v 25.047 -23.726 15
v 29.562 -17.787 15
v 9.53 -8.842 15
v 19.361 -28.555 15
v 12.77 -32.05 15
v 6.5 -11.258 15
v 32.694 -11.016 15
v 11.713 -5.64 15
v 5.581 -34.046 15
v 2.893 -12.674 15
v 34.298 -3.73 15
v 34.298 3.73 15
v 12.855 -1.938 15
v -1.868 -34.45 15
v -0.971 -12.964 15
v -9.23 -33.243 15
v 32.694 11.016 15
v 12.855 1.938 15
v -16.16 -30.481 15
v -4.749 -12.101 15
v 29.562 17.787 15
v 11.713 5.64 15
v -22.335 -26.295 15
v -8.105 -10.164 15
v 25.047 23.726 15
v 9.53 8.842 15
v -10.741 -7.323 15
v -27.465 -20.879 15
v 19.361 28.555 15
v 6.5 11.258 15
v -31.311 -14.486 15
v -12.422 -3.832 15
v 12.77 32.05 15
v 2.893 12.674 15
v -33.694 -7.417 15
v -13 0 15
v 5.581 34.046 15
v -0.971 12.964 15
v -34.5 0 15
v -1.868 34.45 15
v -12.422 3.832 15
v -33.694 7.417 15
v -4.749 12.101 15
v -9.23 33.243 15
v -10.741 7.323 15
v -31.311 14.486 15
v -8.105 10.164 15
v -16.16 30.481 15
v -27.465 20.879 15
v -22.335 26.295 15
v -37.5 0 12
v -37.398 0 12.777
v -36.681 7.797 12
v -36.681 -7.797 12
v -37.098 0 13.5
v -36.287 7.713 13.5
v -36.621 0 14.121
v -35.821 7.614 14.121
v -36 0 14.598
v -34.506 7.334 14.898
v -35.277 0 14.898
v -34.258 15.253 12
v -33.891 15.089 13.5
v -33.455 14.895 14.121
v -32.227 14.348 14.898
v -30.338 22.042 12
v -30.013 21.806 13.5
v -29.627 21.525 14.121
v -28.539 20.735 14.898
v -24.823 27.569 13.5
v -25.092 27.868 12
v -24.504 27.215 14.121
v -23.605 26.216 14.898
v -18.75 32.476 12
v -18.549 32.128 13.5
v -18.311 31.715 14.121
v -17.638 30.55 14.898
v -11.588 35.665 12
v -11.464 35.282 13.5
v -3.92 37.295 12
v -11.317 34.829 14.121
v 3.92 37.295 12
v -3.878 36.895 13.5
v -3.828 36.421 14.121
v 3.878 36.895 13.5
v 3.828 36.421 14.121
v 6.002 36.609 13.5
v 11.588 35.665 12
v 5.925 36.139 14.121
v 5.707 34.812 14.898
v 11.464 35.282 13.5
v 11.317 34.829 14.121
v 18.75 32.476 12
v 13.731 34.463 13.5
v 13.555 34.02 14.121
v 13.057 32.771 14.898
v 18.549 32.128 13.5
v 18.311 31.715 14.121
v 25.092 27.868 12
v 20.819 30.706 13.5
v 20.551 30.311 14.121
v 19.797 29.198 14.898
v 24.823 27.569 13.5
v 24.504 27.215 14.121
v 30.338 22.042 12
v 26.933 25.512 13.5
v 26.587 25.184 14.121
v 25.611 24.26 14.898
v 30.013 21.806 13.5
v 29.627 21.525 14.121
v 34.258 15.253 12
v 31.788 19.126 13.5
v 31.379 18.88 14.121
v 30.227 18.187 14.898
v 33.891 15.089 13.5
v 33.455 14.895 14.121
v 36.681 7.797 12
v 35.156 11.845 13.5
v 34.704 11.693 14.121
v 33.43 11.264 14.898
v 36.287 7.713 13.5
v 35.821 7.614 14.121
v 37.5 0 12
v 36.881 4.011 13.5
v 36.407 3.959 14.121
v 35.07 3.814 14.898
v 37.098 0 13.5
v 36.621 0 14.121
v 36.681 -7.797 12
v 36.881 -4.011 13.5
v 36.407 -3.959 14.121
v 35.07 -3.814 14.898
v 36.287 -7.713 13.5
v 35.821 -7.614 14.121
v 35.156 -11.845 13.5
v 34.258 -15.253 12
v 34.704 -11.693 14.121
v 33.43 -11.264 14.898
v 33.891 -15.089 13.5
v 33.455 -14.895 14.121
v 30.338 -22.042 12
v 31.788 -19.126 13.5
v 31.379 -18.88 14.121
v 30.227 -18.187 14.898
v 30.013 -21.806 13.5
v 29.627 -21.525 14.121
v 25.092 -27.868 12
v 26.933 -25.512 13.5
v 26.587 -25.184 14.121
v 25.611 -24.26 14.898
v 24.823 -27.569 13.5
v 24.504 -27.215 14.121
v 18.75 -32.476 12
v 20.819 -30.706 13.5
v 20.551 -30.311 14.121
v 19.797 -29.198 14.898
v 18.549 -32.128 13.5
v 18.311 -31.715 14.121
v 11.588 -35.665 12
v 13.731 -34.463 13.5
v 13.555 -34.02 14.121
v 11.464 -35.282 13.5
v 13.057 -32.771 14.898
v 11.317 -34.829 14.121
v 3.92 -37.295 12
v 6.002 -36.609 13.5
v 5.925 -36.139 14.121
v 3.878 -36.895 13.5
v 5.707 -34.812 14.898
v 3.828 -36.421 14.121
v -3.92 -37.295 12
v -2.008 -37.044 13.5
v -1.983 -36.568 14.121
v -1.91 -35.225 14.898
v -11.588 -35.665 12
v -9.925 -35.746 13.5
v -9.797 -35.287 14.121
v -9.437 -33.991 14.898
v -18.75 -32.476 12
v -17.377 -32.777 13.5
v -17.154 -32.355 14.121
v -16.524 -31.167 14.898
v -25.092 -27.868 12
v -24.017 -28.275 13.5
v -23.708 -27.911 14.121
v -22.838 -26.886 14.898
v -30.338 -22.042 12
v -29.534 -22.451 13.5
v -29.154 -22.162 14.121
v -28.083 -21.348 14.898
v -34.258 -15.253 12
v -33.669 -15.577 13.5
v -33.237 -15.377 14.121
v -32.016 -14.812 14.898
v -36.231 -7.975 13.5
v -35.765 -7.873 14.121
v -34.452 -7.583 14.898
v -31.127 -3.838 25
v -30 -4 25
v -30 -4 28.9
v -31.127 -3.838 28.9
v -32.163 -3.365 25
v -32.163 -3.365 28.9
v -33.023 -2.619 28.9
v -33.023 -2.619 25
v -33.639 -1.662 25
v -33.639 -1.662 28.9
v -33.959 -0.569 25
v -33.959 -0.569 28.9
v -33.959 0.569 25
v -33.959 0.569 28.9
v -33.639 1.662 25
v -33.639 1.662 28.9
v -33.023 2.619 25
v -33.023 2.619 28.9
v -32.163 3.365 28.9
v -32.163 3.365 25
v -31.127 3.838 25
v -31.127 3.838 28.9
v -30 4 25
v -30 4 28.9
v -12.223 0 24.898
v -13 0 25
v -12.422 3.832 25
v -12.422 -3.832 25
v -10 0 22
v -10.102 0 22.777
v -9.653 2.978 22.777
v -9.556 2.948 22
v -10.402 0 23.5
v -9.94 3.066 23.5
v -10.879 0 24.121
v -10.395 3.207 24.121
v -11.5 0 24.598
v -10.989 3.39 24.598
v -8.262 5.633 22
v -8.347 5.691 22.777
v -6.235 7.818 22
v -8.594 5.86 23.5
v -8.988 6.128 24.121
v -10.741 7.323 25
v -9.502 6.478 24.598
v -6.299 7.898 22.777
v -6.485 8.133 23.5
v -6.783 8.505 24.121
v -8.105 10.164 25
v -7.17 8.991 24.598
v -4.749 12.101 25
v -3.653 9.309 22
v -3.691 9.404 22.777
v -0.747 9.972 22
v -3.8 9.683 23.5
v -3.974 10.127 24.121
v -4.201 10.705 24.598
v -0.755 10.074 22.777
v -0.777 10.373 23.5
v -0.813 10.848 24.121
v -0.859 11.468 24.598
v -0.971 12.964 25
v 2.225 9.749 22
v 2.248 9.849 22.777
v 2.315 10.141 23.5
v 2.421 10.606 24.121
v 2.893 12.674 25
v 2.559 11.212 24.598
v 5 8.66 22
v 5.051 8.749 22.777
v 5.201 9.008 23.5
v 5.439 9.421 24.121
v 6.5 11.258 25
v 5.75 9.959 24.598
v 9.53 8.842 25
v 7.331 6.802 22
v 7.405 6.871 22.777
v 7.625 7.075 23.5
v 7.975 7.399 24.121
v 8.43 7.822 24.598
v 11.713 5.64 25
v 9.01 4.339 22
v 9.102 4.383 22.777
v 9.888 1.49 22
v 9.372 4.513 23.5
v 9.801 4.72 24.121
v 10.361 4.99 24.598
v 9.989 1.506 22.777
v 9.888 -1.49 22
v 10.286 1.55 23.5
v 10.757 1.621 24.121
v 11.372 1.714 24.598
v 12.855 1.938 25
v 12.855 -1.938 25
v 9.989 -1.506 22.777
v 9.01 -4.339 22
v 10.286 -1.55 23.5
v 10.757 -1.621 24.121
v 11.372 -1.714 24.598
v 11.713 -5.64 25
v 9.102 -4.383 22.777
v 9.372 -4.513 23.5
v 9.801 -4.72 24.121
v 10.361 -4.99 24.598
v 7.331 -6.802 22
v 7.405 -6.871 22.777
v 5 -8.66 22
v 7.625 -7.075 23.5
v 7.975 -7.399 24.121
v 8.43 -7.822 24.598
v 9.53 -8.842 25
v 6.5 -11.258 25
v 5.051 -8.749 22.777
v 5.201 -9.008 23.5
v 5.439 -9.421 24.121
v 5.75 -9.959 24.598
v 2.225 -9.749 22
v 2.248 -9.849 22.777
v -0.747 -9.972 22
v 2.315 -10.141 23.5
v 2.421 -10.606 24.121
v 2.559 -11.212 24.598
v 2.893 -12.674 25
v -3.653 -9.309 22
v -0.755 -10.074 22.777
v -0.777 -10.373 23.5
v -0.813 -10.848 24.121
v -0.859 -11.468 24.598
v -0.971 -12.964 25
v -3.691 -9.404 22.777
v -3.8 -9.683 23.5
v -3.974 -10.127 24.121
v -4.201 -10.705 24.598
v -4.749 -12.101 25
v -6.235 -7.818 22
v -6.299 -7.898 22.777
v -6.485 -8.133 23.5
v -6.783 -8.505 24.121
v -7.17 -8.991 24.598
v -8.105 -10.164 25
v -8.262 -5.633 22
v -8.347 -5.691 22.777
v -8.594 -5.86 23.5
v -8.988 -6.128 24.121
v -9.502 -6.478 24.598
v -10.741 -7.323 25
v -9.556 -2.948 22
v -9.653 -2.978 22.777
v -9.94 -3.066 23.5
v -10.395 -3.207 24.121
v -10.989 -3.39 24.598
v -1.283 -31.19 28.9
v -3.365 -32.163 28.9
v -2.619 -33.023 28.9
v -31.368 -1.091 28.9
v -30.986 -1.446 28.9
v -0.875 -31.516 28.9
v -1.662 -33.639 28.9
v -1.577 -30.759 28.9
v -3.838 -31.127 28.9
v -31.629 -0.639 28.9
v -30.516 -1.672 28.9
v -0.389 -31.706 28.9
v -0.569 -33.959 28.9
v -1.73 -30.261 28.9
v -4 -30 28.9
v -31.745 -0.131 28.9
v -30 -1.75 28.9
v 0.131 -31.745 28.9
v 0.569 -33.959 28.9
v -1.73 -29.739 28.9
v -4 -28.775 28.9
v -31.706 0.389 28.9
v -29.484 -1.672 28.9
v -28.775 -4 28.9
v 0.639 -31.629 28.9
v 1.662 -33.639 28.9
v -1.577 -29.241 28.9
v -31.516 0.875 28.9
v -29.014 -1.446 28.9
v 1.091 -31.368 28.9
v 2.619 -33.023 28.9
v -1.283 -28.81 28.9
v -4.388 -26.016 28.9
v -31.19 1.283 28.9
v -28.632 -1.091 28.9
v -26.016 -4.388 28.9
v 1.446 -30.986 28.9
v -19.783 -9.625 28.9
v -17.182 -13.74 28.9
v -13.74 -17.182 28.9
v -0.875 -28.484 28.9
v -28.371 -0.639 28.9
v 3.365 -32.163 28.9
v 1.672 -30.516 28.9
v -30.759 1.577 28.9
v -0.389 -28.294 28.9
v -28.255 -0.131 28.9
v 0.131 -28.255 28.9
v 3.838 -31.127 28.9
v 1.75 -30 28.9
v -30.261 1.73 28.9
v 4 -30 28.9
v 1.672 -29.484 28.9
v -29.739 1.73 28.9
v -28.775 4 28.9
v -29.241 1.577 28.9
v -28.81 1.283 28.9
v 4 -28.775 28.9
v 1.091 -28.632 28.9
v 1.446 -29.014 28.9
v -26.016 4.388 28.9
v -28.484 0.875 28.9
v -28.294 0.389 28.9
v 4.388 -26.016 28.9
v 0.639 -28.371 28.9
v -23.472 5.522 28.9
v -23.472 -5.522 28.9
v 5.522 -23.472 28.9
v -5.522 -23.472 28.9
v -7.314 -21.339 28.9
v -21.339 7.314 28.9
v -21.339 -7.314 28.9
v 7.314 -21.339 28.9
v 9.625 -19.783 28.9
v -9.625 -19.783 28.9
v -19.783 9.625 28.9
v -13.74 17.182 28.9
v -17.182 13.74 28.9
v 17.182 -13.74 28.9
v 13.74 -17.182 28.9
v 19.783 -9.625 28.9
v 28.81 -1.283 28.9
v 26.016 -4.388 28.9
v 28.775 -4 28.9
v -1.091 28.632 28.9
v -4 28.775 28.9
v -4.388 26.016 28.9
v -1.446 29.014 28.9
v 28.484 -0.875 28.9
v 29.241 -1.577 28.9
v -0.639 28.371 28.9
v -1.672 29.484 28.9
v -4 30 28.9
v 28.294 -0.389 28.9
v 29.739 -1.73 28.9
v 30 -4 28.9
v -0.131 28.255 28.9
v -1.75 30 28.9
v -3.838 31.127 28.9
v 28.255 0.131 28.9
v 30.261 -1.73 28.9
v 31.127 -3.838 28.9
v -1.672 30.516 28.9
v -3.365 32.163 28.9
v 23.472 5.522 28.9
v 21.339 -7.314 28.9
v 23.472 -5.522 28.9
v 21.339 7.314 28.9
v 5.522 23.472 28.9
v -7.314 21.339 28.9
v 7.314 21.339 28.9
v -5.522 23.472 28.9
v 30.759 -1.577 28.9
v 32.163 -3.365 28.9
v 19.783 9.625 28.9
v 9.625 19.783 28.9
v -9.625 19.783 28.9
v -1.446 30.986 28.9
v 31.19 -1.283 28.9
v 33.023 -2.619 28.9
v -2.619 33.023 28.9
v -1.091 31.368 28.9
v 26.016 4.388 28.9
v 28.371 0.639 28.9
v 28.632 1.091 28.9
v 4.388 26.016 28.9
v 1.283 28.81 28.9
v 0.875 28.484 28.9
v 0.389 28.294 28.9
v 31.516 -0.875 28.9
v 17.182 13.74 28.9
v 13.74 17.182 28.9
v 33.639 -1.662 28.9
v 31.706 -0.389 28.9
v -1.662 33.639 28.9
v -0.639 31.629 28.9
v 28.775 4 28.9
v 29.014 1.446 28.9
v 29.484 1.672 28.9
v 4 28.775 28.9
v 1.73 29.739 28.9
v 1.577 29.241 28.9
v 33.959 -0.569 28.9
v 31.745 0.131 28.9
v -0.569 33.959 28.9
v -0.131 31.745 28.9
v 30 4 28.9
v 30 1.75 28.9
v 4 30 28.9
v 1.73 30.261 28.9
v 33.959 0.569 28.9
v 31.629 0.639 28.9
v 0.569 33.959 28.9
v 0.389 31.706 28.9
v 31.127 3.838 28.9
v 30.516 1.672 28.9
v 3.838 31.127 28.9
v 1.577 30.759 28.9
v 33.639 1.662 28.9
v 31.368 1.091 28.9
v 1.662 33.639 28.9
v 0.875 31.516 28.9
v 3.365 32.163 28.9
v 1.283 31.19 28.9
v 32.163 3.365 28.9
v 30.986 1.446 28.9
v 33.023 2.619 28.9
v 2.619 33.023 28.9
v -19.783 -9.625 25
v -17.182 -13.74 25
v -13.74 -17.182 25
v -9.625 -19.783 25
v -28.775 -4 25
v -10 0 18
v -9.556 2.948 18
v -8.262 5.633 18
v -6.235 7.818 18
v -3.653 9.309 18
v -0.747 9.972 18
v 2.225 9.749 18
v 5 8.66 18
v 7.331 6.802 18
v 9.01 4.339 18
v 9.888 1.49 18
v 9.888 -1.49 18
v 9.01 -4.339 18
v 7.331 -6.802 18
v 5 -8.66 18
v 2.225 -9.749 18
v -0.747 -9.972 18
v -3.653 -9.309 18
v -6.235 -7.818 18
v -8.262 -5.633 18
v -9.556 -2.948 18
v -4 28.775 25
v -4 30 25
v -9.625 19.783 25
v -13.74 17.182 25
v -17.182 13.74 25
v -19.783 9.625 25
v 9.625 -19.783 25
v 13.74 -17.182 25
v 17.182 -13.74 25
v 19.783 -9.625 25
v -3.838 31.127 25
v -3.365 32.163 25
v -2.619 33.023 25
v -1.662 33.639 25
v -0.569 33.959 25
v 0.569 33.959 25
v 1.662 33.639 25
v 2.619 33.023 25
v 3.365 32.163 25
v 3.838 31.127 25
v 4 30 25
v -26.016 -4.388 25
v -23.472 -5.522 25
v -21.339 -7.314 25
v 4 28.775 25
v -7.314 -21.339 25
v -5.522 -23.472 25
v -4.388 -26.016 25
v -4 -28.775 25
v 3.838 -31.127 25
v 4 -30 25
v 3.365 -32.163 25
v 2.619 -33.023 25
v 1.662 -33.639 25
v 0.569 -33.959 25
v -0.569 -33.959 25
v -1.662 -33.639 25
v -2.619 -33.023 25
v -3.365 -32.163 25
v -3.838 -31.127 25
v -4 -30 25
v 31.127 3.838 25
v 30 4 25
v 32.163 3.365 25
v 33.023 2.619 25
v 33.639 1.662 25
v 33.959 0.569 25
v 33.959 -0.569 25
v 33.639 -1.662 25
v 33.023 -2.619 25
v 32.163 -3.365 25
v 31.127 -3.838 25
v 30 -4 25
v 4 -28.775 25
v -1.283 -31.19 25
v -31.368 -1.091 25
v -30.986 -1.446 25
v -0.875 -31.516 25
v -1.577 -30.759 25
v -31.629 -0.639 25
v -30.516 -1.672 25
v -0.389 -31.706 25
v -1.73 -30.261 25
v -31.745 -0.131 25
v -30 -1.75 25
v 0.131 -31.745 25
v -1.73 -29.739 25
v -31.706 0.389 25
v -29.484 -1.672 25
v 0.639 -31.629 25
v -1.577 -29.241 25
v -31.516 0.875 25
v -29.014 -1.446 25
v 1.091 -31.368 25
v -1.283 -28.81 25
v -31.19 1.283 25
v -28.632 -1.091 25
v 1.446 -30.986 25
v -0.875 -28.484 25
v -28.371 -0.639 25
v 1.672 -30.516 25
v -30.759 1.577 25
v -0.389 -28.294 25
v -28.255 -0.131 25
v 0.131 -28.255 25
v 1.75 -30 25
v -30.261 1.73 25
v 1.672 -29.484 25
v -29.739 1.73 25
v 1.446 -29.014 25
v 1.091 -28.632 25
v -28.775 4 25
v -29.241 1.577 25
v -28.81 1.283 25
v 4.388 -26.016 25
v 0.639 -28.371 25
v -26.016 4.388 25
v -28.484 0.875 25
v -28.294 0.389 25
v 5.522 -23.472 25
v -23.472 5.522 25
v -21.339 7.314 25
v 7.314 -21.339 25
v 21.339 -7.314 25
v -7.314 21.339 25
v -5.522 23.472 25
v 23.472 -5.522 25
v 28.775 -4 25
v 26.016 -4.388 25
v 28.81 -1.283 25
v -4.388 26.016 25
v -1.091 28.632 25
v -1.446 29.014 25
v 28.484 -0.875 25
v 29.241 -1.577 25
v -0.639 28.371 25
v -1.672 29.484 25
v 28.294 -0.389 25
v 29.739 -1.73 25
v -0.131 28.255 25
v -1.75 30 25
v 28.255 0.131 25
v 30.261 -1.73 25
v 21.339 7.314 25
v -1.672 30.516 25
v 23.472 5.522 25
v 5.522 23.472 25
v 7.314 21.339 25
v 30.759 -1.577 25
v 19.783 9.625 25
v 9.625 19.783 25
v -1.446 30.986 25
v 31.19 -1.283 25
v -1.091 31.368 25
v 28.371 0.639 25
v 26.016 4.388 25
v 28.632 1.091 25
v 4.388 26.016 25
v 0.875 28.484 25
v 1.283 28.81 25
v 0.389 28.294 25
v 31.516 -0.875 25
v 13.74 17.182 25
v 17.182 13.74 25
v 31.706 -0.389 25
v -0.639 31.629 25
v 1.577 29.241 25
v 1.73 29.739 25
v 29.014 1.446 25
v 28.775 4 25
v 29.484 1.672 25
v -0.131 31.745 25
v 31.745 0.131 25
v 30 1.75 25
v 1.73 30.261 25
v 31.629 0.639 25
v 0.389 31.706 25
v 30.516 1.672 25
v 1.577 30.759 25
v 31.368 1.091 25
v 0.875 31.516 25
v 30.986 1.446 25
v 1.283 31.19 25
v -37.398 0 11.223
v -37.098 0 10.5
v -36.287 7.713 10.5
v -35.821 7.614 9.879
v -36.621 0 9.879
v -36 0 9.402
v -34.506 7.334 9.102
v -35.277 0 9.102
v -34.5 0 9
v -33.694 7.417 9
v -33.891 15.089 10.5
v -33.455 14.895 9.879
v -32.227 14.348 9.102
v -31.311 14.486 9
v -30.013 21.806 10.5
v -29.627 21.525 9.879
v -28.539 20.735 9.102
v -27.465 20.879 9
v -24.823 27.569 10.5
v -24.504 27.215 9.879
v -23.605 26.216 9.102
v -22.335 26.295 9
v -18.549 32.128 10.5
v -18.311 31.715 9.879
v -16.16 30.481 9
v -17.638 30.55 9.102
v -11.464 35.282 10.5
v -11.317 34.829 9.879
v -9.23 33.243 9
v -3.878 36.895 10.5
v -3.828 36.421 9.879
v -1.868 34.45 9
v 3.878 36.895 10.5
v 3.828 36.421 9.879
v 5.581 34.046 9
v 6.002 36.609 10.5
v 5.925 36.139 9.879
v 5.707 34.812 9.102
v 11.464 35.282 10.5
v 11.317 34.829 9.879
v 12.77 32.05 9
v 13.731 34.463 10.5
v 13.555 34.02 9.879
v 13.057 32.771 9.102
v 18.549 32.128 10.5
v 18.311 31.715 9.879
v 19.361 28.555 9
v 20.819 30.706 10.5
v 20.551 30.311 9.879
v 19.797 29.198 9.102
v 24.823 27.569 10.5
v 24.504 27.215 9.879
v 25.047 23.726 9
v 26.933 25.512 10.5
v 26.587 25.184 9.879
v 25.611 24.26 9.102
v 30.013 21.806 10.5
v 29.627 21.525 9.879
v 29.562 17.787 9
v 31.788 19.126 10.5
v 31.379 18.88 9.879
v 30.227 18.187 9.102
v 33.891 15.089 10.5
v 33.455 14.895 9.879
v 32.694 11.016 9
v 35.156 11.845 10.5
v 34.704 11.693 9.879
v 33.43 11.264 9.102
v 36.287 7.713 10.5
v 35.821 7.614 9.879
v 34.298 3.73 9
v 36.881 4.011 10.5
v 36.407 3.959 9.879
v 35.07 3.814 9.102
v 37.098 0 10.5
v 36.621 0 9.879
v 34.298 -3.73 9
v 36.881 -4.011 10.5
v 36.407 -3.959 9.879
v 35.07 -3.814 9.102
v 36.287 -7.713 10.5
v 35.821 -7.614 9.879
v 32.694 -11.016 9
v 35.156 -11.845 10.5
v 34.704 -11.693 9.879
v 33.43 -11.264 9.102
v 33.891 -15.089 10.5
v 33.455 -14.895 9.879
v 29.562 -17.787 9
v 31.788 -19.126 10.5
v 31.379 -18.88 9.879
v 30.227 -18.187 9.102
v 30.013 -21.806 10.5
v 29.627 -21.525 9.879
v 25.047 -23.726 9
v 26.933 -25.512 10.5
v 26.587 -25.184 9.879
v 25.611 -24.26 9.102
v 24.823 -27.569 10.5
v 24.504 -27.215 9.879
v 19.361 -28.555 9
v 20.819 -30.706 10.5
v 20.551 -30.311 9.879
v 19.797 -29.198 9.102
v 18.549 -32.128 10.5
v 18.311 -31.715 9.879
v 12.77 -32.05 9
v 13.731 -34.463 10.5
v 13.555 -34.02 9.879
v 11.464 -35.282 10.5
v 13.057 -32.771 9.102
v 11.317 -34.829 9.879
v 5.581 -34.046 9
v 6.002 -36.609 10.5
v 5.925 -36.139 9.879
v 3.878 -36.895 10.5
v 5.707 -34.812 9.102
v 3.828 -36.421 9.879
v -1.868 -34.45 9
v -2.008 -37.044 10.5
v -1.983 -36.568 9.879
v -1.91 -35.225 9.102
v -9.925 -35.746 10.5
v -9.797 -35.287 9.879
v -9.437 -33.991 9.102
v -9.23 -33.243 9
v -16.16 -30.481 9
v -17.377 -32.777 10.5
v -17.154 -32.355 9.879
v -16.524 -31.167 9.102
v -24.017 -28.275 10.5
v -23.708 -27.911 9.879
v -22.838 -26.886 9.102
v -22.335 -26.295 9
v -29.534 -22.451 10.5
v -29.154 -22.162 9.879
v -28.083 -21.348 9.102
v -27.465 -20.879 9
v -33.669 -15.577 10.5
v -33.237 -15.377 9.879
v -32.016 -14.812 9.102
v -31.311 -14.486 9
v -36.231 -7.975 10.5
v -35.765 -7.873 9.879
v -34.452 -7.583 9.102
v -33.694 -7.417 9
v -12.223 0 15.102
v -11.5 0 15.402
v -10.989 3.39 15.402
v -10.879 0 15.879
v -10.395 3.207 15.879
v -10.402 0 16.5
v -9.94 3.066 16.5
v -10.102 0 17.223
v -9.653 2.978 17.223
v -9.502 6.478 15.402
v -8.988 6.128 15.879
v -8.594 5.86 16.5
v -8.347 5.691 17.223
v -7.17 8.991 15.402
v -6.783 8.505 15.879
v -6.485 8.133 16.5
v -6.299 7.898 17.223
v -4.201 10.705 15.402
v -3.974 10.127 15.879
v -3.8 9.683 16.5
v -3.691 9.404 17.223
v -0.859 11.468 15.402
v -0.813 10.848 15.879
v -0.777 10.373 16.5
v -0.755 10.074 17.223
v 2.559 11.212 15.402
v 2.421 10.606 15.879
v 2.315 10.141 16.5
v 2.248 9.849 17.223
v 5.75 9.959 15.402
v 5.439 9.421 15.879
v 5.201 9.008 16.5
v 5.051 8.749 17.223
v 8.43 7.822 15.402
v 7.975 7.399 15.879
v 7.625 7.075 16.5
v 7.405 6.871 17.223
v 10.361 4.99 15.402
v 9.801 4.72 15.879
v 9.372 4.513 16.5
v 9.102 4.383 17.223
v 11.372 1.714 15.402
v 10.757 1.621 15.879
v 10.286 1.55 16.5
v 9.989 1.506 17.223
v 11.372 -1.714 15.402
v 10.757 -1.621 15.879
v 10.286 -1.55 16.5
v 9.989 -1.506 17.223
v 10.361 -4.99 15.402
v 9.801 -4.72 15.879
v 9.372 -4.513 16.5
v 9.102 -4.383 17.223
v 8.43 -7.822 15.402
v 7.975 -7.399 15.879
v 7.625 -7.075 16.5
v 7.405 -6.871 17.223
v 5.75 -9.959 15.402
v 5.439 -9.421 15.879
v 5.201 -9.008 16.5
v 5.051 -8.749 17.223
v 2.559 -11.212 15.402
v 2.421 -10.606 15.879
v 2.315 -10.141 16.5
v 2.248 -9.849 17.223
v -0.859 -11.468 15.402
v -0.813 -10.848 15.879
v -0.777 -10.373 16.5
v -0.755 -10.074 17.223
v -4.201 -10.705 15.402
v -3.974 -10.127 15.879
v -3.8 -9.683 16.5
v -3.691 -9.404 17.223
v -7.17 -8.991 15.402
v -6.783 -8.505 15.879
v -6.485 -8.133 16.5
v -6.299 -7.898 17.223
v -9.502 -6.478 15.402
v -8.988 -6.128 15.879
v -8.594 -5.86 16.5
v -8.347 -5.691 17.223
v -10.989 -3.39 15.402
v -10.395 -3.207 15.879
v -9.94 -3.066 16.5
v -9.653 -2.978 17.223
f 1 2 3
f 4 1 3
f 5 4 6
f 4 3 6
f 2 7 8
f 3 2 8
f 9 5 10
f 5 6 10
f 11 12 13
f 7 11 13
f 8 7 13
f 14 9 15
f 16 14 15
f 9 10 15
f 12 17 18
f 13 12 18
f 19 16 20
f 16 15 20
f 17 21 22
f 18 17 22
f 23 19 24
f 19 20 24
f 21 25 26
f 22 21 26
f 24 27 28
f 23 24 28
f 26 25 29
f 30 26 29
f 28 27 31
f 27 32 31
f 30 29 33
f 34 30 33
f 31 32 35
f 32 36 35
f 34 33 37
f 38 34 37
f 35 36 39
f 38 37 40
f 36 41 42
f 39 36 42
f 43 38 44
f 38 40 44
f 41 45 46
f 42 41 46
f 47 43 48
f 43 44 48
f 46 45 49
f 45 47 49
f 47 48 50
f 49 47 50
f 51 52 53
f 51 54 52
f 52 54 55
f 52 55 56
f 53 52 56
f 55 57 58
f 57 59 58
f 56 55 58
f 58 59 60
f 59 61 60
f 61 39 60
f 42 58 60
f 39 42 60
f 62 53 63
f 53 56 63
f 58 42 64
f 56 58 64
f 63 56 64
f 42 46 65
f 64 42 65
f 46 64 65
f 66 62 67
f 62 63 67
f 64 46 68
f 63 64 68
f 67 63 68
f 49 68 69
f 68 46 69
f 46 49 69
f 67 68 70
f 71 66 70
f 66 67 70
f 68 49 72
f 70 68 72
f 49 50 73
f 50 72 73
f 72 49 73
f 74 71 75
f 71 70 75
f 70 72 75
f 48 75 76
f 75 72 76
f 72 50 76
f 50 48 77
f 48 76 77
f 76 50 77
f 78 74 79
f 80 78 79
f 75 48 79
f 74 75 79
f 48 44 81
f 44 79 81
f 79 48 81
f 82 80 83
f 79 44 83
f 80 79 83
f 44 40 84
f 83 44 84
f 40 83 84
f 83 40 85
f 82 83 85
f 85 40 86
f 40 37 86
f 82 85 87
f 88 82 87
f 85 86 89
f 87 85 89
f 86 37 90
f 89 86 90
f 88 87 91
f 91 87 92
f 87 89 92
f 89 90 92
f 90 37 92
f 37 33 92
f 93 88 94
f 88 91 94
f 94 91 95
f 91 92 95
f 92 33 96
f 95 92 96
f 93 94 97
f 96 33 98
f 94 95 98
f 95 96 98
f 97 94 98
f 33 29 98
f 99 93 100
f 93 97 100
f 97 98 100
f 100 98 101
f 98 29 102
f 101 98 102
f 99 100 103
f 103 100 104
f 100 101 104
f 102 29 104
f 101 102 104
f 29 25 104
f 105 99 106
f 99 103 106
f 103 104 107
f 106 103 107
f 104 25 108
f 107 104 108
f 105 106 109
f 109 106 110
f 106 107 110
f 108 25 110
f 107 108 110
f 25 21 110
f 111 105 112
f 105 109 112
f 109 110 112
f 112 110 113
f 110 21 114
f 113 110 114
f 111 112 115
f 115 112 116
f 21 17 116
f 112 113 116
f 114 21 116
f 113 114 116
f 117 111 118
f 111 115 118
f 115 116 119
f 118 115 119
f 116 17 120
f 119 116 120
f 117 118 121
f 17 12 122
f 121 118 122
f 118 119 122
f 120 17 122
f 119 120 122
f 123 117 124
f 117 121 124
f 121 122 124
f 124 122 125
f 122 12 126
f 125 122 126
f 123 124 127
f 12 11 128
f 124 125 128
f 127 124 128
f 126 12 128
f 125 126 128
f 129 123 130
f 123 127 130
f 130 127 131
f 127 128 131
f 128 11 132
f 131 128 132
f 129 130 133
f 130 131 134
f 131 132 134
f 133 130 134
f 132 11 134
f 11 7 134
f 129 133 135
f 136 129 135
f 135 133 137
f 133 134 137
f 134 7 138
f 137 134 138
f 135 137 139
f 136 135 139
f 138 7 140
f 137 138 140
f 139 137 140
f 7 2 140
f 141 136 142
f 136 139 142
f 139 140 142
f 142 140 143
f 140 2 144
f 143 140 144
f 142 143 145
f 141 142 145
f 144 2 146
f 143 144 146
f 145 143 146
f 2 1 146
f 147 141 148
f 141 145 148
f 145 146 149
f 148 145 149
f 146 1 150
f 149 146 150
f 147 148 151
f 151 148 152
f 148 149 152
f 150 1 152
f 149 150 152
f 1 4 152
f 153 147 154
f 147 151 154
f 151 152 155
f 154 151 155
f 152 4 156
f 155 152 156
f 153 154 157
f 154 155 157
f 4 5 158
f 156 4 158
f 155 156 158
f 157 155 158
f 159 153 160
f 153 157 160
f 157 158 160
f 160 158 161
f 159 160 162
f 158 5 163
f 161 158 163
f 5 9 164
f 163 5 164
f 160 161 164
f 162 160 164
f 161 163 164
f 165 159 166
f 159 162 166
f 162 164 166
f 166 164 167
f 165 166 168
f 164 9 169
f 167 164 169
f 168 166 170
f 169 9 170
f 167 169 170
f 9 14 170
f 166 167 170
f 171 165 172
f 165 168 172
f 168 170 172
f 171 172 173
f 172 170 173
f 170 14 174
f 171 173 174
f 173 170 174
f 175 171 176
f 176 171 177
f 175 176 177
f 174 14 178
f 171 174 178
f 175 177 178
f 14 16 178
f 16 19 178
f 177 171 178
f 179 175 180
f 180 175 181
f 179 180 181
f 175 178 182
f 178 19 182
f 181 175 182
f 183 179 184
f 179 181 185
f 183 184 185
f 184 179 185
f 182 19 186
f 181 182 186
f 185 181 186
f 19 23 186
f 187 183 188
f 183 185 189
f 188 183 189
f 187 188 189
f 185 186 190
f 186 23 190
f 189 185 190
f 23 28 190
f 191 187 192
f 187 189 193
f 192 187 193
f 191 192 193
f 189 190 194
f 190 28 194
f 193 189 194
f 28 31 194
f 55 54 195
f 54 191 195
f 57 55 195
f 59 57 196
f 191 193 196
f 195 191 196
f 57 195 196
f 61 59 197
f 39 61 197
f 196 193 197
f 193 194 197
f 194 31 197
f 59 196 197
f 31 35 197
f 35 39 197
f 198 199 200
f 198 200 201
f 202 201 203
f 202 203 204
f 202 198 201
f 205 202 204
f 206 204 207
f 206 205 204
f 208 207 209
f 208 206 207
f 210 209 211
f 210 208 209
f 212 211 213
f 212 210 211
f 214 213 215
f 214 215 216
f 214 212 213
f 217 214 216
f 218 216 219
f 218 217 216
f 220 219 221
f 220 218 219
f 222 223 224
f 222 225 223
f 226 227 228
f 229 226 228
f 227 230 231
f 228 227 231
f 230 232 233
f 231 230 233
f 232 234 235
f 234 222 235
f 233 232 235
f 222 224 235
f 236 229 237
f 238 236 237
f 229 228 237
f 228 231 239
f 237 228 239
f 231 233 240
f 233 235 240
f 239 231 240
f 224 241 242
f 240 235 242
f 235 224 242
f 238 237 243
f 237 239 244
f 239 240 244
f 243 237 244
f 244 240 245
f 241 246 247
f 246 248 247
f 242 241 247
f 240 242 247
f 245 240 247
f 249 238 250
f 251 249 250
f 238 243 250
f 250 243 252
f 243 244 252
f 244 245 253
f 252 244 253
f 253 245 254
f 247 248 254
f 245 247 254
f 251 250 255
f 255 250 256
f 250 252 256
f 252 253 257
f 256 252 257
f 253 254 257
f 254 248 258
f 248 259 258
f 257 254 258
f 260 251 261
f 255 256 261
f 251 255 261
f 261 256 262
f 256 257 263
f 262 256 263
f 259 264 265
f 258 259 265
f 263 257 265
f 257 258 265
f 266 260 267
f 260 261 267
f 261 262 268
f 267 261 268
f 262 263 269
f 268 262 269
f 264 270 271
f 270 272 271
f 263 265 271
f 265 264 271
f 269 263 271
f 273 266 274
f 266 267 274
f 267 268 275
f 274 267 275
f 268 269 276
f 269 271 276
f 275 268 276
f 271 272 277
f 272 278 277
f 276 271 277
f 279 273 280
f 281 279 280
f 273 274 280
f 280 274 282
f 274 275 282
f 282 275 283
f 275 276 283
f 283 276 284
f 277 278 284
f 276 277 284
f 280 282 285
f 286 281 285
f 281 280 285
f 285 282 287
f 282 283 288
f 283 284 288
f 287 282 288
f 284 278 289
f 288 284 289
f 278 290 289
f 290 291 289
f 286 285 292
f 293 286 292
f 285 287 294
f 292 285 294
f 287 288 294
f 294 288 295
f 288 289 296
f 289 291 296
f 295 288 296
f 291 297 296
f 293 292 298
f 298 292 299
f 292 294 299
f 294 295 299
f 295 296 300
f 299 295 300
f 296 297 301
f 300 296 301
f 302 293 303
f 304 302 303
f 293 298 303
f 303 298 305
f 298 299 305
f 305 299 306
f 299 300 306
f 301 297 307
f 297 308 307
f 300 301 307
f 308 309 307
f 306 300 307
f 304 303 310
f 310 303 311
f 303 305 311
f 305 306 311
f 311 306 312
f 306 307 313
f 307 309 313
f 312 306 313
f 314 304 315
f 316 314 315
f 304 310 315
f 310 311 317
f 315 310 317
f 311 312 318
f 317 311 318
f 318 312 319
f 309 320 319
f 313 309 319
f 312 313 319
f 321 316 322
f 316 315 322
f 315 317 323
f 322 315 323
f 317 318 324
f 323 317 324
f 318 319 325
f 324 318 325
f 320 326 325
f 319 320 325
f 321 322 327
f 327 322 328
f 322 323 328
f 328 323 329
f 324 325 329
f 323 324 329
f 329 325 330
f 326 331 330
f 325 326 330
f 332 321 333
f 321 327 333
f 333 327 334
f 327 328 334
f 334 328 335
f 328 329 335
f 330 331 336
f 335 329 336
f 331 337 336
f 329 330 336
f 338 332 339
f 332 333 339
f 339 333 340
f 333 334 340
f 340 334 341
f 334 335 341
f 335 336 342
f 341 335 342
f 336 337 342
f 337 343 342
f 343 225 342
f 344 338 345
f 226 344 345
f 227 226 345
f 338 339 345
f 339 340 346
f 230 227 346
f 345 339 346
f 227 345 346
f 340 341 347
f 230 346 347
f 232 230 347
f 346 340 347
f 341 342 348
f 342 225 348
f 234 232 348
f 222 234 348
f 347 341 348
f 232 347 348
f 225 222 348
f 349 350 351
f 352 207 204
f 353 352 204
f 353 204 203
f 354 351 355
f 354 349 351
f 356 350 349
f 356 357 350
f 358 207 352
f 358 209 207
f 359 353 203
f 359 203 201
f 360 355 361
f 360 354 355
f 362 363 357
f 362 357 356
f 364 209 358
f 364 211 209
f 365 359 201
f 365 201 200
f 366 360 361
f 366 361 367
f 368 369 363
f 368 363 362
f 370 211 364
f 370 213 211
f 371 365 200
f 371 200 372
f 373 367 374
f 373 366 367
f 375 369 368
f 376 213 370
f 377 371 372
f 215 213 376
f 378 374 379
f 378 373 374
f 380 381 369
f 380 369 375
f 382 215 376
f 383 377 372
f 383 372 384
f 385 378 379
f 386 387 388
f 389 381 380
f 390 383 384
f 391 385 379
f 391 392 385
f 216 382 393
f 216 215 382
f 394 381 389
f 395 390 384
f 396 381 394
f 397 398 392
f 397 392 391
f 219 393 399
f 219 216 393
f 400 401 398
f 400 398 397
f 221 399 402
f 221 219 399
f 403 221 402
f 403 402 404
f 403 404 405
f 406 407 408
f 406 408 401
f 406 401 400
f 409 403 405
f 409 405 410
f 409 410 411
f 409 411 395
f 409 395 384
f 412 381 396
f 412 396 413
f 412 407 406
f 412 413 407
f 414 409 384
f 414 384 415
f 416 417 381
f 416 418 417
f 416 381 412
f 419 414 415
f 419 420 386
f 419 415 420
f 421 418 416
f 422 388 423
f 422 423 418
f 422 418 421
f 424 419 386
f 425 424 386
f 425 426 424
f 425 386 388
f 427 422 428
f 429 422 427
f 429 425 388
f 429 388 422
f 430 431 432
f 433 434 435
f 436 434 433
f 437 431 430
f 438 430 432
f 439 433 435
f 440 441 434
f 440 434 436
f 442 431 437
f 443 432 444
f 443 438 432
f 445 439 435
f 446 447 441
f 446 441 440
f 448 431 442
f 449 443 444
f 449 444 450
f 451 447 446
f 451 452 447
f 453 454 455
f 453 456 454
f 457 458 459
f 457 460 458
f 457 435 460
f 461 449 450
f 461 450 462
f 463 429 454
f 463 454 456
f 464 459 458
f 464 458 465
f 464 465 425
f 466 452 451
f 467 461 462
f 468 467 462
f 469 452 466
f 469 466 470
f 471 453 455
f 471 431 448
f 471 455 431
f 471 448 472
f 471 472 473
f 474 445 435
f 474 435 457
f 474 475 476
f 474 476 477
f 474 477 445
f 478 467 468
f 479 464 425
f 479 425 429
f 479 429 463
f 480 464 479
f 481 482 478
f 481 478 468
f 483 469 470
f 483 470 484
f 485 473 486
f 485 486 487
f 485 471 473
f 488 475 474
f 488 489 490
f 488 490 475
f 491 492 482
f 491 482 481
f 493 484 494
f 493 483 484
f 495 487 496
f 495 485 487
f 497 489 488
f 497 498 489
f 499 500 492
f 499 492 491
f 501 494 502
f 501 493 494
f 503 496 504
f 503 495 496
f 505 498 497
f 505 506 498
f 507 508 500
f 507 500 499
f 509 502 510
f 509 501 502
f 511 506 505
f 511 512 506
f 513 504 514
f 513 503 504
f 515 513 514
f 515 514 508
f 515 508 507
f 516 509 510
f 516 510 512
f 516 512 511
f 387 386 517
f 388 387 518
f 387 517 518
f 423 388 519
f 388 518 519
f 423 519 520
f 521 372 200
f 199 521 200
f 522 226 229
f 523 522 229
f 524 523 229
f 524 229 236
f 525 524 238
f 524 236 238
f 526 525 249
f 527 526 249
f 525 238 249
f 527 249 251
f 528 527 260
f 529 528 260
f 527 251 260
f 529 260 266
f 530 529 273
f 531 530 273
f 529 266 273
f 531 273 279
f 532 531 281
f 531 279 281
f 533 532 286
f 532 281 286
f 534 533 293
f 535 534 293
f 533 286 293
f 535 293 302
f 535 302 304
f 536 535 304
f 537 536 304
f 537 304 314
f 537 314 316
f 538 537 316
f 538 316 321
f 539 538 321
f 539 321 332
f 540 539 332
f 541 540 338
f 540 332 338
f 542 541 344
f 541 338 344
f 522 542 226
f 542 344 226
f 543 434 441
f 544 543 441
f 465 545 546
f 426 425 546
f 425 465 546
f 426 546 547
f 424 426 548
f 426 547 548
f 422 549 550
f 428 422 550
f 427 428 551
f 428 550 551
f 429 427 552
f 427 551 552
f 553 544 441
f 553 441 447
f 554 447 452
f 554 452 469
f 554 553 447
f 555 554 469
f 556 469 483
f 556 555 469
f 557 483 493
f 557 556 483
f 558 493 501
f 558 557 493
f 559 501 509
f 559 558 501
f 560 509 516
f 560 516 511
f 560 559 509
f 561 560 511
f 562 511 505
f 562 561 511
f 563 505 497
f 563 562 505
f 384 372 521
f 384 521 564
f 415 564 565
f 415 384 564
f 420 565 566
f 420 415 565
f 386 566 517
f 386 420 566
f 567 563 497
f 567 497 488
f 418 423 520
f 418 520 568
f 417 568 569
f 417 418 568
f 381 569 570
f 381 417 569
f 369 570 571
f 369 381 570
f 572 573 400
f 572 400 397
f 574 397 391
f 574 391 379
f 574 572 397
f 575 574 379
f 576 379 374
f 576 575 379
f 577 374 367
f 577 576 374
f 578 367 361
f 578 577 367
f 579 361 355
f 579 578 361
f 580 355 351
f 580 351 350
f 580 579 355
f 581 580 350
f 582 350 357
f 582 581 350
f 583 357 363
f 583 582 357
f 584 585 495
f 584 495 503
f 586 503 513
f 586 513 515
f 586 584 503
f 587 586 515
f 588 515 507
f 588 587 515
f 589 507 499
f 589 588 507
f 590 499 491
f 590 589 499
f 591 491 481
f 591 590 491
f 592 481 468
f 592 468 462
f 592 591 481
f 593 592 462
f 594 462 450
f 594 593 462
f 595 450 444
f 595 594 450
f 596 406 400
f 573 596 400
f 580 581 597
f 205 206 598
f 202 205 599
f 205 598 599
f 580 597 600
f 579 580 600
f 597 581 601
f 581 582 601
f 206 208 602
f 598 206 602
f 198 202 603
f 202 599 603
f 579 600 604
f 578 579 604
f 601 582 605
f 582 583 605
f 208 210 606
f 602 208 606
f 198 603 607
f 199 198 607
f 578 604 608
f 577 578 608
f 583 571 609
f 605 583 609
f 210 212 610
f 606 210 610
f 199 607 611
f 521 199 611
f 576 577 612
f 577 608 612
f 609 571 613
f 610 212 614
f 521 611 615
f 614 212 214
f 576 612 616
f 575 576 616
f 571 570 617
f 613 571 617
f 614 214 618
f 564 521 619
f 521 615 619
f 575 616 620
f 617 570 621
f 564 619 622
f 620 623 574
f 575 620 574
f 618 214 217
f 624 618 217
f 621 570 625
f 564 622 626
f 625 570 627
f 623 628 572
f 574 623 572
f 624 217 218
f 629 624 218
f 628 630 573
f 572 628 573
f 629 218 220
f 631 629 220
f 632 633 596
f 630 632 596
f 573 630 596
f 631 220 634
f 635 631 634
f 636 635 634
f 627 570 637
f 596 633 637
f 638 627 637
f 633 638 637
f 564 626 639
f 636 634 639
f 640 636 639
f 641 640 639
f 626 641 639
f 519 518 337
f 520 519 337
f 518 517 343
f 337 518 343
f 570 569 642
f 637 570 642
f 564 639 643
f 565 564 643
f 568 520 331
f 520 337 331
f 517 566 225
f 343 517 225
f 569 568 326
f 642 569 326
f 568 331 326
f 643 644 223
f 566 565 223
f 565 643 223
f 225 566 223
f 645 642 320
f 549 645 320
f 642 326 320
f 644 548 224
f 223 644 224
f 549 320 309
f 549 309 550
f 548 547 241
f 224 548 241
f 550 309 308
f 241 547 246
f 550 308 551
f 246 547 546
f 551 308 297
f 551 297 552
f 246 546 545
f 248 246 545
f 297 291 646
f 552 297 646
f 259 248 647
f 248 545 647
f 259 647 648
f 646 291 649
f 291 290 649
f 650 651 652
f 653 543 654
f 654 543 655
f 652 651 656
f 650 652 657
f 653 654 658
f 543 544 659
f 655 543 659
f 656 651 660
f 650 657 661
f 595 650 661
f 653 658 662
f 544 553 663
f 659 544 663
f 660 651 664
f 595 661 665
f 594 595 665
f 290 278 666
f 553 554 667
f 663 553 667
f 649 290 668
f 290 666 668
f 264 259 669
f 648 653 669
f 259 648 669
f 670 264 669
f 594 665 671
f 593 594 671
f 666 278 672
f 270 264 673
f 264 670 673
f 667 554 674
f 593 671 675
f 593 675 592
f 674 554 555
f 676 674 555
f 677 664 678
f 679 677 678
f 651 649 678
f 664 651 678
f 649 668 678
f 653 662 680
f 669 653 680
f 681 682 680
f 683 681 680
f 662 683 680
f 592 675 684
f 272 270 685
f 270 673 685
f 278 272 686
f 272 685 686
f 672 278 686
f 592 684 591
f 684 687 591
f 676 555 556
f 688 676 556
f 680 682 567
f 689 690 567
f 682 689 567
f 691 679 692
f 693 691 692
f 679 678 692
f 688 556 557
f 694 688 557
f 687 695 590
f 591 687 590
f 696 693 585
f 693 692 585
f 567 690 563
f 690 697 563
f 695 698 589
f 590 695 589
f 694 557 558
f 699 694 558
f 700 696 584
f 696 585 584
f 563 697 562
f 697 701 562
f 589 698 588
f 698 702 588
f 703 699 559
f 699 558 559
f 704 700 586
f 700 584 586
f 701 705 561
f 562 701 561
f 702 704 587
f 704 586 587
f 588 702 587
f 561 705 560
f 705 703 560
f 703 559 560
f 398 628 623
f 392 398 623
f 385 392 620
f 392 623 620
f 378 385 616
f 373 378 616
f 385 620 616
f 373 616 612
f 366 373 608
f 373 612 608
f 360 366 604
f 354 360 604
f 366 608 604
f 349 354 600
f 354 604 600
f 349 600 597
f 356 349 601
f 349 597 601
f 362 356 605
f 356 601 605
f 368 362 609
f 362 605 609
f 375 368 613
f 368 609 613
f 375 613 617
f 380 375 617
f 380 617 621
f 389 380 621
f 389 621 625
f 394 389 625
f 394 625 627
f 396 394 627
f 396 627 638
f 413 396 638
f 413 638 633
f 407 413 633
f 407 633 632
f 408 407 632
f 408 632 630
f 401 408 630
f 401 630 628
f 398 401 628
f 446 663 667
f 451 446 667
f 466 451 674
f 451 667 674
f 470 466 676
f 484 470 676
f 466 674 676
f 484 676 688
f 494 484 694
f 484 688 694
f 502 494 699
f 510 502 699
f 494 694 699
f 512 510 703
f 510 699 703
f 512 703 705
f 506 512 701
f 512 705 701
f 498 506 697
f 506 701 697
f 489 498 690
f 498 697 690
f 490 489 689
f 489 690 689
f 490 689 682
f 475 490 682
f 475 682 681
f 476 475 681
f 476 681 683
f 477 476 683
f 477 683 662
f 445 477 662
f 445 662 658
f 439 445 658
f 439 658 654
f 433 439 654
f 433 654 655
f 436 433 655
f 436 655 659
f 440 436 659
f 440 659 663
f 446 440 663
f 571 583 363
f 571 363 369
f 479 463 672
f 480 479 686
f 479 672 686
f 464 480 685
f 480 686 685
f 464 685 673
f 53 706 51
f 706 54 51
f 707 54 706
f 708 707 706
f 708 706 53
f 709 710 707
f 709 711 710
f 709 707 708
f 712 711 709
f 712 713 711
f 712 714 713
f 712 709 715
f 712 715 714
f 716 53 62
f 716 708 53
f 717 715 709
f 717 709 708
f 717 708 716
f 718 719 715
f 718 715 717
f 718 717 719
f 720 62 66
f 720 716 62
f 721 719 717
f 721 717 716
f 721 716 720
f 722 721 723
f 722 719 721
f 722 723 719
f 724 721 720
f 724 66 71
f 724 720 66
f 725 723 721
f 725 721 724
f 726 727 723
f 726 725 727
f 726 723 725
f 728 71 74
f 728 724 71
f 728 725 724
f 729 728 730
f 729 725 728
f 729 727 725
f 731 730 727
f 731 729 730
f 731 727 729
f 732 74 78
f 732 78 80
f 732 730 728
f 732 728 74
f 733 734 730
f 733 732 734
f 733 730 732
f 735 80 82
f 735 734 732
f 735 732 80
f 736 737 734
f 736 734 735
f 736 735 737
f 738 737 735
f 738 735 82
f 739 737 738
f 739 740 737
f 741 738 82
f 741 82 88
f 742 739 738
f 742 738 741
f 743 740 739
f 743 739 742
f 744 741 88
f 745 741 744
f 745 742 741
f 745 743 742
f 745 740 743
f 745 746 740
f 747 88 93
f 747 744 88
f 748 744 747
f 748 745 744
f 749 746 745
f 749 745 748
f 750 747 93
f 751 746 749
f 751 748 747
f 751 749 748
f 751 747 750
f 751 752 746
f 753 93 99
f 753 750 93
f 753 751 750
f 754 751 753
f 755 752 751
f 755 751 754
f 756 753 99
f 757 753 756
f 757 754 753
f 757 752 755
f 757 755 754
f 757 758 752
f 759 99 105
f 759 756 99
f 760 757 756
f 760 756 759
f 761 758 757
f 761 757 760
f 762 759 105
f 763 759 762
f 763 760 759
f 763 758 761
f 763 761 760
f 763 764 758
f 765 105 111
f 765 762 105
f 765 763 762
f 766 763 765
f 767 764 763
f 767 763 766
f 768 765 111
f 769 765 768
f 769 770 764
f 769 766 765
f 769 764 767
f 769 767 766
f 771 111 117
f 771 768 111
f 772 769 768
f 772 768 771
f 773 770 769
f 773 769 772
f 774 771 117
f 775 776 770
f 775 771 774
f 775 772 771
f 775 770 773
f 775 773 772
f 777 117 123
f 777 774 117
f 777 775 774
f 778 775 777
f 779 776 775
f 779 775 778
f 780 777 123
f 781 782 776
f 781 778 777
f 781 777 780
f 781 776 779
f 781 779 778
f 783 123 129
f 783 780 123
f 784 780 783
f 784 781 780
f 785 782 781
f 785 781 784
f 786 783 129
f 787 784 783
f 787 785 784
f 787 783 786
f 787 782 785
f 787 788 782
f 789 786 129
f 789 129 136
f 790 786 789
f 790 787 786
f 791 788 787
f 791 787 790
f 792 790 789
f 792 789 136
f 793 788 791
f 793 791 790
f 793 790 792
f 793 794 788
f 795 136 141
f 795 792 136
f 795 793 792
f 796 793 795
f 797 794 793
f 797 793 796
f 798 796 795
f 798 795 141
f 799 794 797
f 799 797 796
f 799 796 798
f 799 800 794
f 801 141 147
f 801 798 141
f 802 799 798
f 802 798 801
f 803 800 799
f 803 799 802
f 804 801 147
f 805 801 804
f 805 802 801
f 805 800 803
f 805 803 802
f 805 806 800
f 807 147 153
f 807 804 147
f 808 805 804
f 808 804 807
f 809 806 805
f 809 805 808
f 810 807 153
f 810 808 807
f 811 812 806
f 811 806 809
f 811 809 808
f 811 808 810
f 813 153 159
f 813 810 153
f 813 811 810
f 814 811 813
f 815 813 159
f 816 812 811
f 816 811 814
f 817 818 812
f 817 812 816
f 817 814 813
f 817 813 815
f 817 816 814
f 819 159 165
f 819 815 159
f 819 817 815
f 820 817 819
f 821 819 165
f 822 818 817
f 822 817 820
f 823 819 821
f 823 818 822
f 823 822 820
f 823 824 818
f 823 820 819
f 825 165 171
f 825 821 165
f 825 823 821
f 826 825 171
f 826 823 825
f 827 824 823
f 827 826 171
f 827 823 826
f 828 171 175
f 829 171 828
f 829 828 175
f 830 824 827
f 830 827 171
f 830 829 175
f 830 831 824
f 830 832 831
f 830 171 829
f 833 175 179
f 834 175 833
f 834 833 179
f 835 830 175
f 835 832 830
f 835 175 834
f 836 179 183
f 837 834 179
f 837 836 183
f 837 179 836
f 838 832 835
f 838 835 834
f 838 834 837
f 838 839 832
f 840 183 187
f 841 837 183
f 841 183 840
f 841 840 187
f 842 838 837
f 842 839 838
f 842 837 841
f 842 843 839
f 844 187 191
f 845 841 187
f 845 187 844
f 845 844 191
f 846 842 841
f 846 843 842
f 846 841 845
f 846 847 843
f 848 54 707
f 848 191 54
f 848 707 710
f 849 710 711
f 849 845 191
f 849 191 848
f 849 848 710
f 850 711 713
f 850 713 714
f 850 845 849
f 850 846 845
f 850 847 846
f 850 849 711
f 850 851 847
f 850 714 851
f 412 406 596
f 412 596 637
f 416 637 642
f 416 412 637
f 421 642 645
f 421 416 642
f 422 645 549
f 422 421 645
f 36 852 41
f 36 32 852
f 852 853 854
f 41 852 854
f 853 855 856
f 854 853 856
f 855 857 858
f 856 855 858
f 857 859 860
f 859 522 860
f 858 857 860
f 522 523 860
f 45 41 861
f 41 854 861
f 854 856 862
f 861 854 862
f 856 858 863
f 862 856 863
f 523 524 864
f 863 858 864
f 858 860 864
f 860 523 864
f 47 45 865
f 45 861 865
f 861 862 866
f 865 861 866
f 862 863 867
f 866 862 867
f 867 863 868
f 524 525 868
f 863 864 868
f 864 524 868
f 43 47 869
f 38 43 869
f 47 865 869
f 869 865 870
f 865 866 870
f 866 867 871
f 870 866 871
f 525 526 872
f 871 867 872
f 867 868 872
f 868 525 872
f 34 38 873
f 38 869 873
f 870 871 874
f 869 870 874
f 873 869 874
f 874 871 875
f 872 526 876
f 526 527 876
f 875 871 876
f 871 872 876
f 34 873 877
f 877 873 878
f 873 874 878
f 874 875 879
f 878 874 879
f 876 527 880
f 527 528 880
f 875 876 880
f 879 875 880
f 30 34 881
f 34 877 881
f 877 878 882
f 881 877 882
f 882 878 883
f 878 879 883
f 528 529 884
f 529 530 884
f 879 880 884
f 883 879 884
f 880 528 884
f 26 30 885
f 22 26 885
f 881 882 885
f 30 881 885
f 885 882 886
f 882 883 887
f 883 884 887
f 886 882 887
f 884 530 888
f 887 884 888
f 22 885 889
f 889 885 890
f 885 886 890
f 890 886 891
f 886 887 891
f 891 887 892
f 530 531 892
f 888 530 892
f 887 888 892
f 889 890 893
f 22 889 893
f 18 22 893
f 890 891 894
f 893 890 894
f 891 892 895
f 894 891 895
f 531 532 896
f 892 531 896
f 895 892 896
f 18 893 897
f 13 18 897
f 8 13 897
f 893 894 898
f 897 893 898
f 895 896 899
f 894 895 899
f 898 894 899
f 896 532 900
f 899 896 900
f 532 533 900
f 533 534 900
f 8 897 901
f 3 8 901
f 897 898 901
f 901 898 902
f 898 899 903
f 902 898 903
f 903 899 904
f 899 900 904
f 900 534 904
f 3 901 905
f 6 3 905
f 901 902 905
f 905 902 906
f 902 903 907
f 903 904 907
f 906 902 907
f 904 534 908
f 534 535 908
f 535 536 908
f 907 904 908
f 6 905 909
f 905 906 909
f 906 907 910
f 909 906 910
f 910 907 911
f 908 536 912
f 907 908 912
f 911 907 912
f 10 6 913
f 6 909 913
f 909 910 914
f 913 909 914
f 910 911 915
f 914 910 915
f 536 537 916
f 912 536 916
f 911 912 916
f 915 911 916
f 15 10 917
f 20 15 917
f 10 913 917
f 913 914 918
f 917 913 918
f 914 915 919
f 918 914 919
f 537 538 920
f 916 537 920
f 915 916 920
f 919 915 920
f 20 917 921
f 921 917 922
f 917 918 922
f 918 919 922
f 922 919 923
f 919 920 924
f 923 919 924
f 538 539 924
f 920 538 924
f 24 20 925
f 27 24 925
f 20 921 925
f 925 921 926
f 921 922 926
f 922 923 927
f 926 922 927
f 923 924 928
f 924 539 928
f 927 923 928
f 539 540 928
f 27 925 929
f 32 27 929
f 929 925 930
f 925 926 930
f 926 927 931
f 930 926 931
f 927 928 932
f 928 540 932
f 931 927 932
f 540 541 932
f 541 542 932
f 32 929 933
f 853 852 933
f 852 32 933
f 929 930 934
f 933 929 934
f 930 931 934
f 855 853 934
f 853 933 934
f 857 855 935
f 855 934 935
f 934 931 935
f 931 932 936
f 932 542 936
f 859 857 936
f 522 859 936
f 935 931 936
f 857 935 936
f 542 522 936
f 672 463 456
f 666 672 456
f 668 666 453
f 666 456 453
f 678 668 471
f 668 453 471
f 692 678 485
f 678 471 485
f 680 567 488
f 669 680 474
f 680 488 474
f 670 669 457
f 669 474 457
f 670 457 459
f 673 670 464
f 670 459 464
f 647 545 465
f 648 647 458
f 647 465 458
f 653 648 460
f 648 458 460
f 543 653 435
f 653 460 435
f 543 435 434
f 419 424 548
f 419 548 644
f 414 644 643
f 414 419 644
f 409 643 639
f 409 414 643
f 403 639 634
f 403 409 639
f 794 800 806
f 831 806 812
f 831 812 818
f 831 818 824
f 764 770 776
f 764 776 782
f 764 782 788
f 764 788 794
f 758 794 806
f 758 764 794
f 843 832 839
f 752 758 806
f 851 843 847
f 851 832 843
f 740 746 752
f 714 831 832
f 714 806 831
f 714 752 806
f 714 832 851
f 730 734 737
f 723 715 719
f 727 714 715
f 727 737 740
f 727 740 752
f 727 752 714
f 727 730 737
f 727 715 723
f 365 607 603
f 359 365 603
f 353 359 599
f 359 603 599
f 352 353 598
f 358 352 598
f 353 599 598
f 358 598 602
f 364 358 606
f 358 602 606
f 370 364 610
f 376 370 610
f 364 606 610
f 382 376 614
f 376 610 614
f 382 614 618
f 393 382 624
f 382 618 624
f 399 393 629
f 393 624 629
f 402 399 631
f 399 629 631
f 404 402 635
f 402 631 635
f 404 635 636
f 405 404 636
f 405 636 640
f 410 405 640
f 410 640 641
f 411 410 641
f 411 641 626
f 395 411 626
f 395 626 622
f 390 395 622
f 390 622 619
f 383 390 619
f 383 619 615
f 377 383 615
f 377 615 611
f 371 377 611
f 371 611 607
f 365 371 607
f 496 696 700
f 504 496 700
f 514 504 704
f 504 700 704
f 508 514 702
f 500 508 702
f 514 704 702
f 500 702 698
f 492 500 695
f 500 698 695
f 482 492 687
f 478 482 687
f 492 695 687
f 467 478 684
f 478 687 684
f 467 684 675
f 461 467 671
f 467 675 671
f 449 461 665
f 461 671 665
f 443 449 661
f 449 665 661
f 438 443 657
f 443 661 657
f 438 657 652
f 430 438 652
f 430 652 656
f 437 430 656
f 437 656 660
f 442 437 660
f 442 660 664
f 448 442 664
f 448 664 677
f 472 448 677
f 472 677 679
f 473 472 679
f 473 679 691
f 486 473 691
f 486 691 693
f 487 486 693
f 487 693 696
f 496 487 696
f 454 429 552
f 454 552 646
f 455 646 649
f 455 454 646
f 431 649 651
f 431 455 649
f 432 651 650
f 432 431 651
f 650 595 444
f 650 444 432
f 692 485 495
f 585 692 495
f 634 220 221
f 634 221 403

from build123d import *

# Parameters (mm, degrees)
SKETCH2_R           = 15
SKETCH1_R           = 25
SKETCH3_R           = 15
BOSS_EXTRUDE1_DEPTH = 5
FILLET1_R           = 10
SKETCH4_R           = 1.75
CUT_EXTRUDE1_DEPTH  = 130
SKETCH5_R           = 4
CUT_EXTRUDE2_DEPTH  = 130
SKETCH6_R           = 22
BOSS_EXTRUDE2_DEPTH = 4
SKETCH7_R           = 17
BOSS_EXTRUDE3_DEPTH = 20
SKETCH15_W          = 8.431609766
SKETCH15_H          = 4
SKETCH15_W_2        = 8.578672696
SKETCH18_R          = 12.5
CUT_EXTRUDE5_DEPTH  = 20
SKETCH19_R          = 47.987160243
CUT_EXTRUDE6_DEPTH  = 44.301270362
SKETCH20_R          = 1.75
BOSS_EXTRUDE5_DEPTH = 4
CIRPATTERN3_COUNT   = 4
FILLET2_R           = 10
CHAMFER1_SIZE       = 0.5
SKETCH22_W          = 15
SKETCH22_H          = 8
BOSS_EXTRUDE6_DEPTH = 7.5
CUT_EXTRUDE7_DEPTH  = 0.75
CHAMFER2_SIZE       = 3
CHAMFER3_SIZE       = 0.5
CUT_EXTRUDE8_START  = -0.1
SKETCH24_R          = 41.017326151
SKETCH24_R_2        = 17
CUT_EXTRUDE8_DEPTH  = 0.1
SKETCH26_W          = 86.249785383
SKETCH26_H          = 35.556355766
CUT_EXTRUDE9_DEPTH  = 50
SKETCH27_R          = 10
BOSS_EXTRUDE7_DEPTH = 10
SKETCH28_R          = 37.5
BOSS_EXTRUDE8_DEPTH = 6
FILLET3_R           = 3


with BuildPart() as part:
    # Sketch2 → Loft1 section 0
    with BuildSketch(Plane.XY.offset(20)):
        Circle(SKETCH2_R)
    # Sketch1 → Loft1 section 1
    with BuildSketch(Plane.XY):
        Circle(SKETCH1_R)
    loft()

    # Sketch3 → Boss-Extrude1 (add)
    with BuildSketch(Plane.XY.offset(20)):
        Circle(SKETCH3_R)
    extrude(amount=BOSS_EXTRUDE1_DEPTH)

    # Fillet1
    fillet1_edges = [part.edges().sort_by_distance(p)[0] for p in [
        (-15, 0, 20),
    ]]
    fillet(fillet1_edges, radius=FILLET1_R)

    # Sketch4 → Cut-Extrude1 (cut)
    with BuildSketch(Plane(origin=(0, 0, 0), x_dir=(-1, 0, 0), z_dir=(0, 0, -1))):
        with Locations((0, 20)):
            Circle(SKETCH4_R)
        with Locations((-20, 0)):
            Circle(SKETCH4_R)
        with Locations((0, -20)):
            Circle(SKETCH4_R)
        with Locations((20, 0)):
            Circle(SKETCH4_R)
    extrude(amount=-CUT_EXTRUDE1_DEPTH, mode=Mode.SUBTRACT)

    # Sketch5 → Cut-Extrude2 (cut)
    with BuildSketch(Plane(origin=(0, 0, 3), x_dir=(-1, 0, 0), z_dir=(0, 0, -1))):
        with Locations((0, 20)):
            Circle(SKETCH5_R)
        with Locations((20, 0)):
            Circle(SKETCH5_R)
        with Locations((-20, 0)):
            Circle(SKETCH5_R)
        with Locations((0, -20)):
            Circle(SKETCH5_R)
    extrude(amount=-CUT_EXTRUDE2_DEPTH, mode=Mode.SUBTRACT)

    # Sketch6 → Boss-Extrude2 (add)
    with BuildSketch(Plane.XY.offset(25)):
        Circle(SKETCH6_R)
    extrude(amount=BOSS_EXTRUDE2_DEPTH)

    # Sketch7 → Boss-Extrude3 (add)
    with BuildSketch(Plane.XY.offset(29)):
        Circle(SKETCH7_R)
    extrude(amount=BOSS_EXTRUDE3_DEPTH)

    # Sketch15 → Cut-Revolve1 (revolve, cut)
    with BuildSketch(Plane(origin=(0, 0, 0), x_dir=(1, 0, 0), z_dir=(0, 1, 0))):
        with Locations((-17.215804883, -35)):
            Rectangle(SKETCH15_W, SKETCH15_H)
        with Locations((-17.289336348, -43)):
            Rectangle(SKETCH15_W_2, SKETCH15_H)
    revolve(axis=Axis((0, 0, 29), (0, 0, 1)), mode=Mode.SUBTRACT)

    # Sketch18 → Cut-Extrude5 (cut)
    with BuildSketch(Plane(origin=(0, 0, 0), x_dir=(-1, 0, 0), z_dir=(0, 0, -1))):
        Circle(SKETCH18_R)
    extrude(amount=-CUT_EXTRUDE5_DEPTH, mode=Mode.SUBTRACT)

    # Sketch19 → Cut-Extrude6 (cut, through all)
    with BuildSketch(Plane(origin=(0, 0, 25), x_dir=(-1, 0, 0), z_dir=(0, 0, -1))):
        Circle(SKETCH19_R)
    extrude(amount=CUT_EXTRUDE6_DEPTH, mode=Mode.SUBTRACT)

    # Sketch20 → Boss-Extrude5 (add)
    with BuildSketch(Plane(origin=(0, 0, 25), x_dir=(-1, 0, 0), z_dir=(0, 0, -1))):
        with BuildLine():
            Line((-4, 30), (-4, 21.633307653))
            ThreePointArc((-4, 21.633307653), (0, 22), (4, 21.633307653))
            Line((4, 21.633307653), (4, 30))
            ThreePointArc((4, 30), (0, 34), (-4, 30))
        make_face()
        with Locations((0, 30)):
            Circle(SKETCH20_R, mode=Mode.SUBTRACT)
    boss_extrude5 = extrude(amount=-BOSS_EXTRUDE5_DEPTH)

    # CirPattern3: Boss-Extrude5 ×4 about axis
    cirpattern3_axis = Axis((0, 0, 0), (0, 0, 1))
    for i in range(1, CIRPATTERN3_COUNT):
        add(boss_extrude5.rotate(cirpattern3_axis, i * 360 / CIRPATTERN3_COUNT))

    # Fillet2
    fillet2_edges = [part.edges().sort_by_distance(p)[0] for p in [
        (-4, 21.633307653, 27),
        (4, 21.633307653, 27),
        (-21.633307653, -4, 27),
        (-21.633307653, 4, 27),
        (4, -21.633307653, 27),
        (-4, -21.633307653, 27),
        (21.633307653, 4, 27),
        (21.633307653, -4, 27),
    ]]
    fillet(fillet2_edges, radius=FILLET2_R)

    # Chamfer1
    chamfer1_edges = [part.edges().sort_by_distance(p)[0] for p in [
        (-17, 0, 49),
        (-17, 0, 37),
        (-17, 0, 33),
        (-17, 0, 45),
        (-17, 0, 41),
    ]]
    chamfer(chamfer1_edges, length=CHAMFER1_SIZE)

    # Sketch22 → Boss-Extrude6 (add, symmetric)
    with BuildSketch(Plane(origin=(0, 0, 0), x_dir=(1, 0, 0), z_dir=(0, 1, 0))):
        with Locations((0, -53)):
            Rectangle(SKETCH22_W, SKETCH22_H)
    extrude(amount=BOSS_EXTRUDE6_DEPTH, both=True)

    # Sketch23 → Cut-Extrude7 (cut, symmetric)
    with BuildSketch(Plane(origin=(0, 0, 0), x_dir=(1, 0, 0), z_dir=(0, 1, 0))):
        with BuildLine():
            Line((7.5, -53.009618943), (7.5, -49))
            Line((7.5, -49), (-7.5, -49))
            Line((-7.5, -49), (-7.5, -53.009618943))
            ThreePointArc((-7.5, -53.009618943), (0, -51), (7.5, -53.009618943))
        make_face()
    extrude(amount=CUT_EXTRUDE7_DEPTH, both=True, mode=Mode.SUBTRACT)

    # Chamfer2
    chamfer2_edges = [part.edges().sort_by_distance(p)[0] for p in [
        (7.5, -7.5, 53),
        (-7.5, -7.5, 53),
        (7.5, 7.5, 53),
        (-7.5, 7.5, 53),
    ]]
    chamfer(chamfer2_edges, length=CHAMFER2_SIZE)

    # Chamfer3
    chamfer3_edges = [part.edges().sort_by_distance(p)[0] for p in [
        (-7.5, -2.625, 49),
        (7.5, -2.625, 49),
        (7.5, 2.625, 49),
        (7.5, 0, 57),
        (0, -7.5, 57),
        (0, -7.5, 49),
        (0, 7.5, 57),
        (-7.5, 0, 57),
        (-6, 6, 57),
        (-6, -6, 57),
        (6, 6, 57),
        (6, -6, 57),
        (0, 7.5, 49),
        (-7.5, 2.625, 49),
        (6, -6, 49),
        (6, 6, 49),
        (-6, -6, 49),
        (-6, 6, 49),
    ]]
    chamfer(chamfer3_edges, length=CHAMFER3_SIZE)

    # Sketch24 → Cut-Extrude8 (cut)
    with BuildSketch(Plane.XY.offset(29).offset(CUT_EXTRUDE8_START)):
        Circle(SKETCH24_R)
        with Locations(Location((0, 0, 0), (0, 0, 180))):
            Circle(SKETCH24_R_2, mode=Mode.SUBTRACT)
    extrude(amount=CUT_EXTRUDE8_DEPTH, mode=Mode.SUBTRACT)

    # Sketch26 → Cut-Extrude9 (cut, symmetric)
    with BuildSketch(Plane(origin=(0, 0, 0), x_dir=(1, 0, 0), z_dir=(0, 1, 0))):
        with Locations((1.892134232, -46.678177883)):
            Rectangle(SKETCH26_W, SKETCH26_H)
    extrude(amount=CUT_EXTRUDE9_DEPTH, both=True, mode=Mode.SUBTRACT)

    # Sketch27 → Boss-Extrude7 (add)
    with BuildSketch(Plane(origin=(0, 0, 25), x_dir=(-1, 0, 0), z_dir=(0, 0, -1))):
        Circle(SKETCH27_R)
    extrude(amount=BOSS_EXTRUDE7_DEPTH)

    # Sketch28 → Boss-Extrude8 (add)
    with BuildSketch(Plane(origin=(0, 0, 15), x_dir=(-1, 0, 0), z_dir=(0, 0, -1))):
        Circle(SKETCH28_R)
    extrude(amount=BOSS_EXTRUDE8_DEPTH)

    # Fillet3
    fillet3_edges = [part.edges().sort_by_distance(p)[0] for p in [
        (10, 0, 25),
        (10, 0, 15),
        (37.5, 0, 15),
        (37.5, 0, 9),
    ]]
    fillet(fillet3_edges, radius=FILLET3_R - 0.0001)  # a hair under: the kernel refuses the full size


solid = part.part
